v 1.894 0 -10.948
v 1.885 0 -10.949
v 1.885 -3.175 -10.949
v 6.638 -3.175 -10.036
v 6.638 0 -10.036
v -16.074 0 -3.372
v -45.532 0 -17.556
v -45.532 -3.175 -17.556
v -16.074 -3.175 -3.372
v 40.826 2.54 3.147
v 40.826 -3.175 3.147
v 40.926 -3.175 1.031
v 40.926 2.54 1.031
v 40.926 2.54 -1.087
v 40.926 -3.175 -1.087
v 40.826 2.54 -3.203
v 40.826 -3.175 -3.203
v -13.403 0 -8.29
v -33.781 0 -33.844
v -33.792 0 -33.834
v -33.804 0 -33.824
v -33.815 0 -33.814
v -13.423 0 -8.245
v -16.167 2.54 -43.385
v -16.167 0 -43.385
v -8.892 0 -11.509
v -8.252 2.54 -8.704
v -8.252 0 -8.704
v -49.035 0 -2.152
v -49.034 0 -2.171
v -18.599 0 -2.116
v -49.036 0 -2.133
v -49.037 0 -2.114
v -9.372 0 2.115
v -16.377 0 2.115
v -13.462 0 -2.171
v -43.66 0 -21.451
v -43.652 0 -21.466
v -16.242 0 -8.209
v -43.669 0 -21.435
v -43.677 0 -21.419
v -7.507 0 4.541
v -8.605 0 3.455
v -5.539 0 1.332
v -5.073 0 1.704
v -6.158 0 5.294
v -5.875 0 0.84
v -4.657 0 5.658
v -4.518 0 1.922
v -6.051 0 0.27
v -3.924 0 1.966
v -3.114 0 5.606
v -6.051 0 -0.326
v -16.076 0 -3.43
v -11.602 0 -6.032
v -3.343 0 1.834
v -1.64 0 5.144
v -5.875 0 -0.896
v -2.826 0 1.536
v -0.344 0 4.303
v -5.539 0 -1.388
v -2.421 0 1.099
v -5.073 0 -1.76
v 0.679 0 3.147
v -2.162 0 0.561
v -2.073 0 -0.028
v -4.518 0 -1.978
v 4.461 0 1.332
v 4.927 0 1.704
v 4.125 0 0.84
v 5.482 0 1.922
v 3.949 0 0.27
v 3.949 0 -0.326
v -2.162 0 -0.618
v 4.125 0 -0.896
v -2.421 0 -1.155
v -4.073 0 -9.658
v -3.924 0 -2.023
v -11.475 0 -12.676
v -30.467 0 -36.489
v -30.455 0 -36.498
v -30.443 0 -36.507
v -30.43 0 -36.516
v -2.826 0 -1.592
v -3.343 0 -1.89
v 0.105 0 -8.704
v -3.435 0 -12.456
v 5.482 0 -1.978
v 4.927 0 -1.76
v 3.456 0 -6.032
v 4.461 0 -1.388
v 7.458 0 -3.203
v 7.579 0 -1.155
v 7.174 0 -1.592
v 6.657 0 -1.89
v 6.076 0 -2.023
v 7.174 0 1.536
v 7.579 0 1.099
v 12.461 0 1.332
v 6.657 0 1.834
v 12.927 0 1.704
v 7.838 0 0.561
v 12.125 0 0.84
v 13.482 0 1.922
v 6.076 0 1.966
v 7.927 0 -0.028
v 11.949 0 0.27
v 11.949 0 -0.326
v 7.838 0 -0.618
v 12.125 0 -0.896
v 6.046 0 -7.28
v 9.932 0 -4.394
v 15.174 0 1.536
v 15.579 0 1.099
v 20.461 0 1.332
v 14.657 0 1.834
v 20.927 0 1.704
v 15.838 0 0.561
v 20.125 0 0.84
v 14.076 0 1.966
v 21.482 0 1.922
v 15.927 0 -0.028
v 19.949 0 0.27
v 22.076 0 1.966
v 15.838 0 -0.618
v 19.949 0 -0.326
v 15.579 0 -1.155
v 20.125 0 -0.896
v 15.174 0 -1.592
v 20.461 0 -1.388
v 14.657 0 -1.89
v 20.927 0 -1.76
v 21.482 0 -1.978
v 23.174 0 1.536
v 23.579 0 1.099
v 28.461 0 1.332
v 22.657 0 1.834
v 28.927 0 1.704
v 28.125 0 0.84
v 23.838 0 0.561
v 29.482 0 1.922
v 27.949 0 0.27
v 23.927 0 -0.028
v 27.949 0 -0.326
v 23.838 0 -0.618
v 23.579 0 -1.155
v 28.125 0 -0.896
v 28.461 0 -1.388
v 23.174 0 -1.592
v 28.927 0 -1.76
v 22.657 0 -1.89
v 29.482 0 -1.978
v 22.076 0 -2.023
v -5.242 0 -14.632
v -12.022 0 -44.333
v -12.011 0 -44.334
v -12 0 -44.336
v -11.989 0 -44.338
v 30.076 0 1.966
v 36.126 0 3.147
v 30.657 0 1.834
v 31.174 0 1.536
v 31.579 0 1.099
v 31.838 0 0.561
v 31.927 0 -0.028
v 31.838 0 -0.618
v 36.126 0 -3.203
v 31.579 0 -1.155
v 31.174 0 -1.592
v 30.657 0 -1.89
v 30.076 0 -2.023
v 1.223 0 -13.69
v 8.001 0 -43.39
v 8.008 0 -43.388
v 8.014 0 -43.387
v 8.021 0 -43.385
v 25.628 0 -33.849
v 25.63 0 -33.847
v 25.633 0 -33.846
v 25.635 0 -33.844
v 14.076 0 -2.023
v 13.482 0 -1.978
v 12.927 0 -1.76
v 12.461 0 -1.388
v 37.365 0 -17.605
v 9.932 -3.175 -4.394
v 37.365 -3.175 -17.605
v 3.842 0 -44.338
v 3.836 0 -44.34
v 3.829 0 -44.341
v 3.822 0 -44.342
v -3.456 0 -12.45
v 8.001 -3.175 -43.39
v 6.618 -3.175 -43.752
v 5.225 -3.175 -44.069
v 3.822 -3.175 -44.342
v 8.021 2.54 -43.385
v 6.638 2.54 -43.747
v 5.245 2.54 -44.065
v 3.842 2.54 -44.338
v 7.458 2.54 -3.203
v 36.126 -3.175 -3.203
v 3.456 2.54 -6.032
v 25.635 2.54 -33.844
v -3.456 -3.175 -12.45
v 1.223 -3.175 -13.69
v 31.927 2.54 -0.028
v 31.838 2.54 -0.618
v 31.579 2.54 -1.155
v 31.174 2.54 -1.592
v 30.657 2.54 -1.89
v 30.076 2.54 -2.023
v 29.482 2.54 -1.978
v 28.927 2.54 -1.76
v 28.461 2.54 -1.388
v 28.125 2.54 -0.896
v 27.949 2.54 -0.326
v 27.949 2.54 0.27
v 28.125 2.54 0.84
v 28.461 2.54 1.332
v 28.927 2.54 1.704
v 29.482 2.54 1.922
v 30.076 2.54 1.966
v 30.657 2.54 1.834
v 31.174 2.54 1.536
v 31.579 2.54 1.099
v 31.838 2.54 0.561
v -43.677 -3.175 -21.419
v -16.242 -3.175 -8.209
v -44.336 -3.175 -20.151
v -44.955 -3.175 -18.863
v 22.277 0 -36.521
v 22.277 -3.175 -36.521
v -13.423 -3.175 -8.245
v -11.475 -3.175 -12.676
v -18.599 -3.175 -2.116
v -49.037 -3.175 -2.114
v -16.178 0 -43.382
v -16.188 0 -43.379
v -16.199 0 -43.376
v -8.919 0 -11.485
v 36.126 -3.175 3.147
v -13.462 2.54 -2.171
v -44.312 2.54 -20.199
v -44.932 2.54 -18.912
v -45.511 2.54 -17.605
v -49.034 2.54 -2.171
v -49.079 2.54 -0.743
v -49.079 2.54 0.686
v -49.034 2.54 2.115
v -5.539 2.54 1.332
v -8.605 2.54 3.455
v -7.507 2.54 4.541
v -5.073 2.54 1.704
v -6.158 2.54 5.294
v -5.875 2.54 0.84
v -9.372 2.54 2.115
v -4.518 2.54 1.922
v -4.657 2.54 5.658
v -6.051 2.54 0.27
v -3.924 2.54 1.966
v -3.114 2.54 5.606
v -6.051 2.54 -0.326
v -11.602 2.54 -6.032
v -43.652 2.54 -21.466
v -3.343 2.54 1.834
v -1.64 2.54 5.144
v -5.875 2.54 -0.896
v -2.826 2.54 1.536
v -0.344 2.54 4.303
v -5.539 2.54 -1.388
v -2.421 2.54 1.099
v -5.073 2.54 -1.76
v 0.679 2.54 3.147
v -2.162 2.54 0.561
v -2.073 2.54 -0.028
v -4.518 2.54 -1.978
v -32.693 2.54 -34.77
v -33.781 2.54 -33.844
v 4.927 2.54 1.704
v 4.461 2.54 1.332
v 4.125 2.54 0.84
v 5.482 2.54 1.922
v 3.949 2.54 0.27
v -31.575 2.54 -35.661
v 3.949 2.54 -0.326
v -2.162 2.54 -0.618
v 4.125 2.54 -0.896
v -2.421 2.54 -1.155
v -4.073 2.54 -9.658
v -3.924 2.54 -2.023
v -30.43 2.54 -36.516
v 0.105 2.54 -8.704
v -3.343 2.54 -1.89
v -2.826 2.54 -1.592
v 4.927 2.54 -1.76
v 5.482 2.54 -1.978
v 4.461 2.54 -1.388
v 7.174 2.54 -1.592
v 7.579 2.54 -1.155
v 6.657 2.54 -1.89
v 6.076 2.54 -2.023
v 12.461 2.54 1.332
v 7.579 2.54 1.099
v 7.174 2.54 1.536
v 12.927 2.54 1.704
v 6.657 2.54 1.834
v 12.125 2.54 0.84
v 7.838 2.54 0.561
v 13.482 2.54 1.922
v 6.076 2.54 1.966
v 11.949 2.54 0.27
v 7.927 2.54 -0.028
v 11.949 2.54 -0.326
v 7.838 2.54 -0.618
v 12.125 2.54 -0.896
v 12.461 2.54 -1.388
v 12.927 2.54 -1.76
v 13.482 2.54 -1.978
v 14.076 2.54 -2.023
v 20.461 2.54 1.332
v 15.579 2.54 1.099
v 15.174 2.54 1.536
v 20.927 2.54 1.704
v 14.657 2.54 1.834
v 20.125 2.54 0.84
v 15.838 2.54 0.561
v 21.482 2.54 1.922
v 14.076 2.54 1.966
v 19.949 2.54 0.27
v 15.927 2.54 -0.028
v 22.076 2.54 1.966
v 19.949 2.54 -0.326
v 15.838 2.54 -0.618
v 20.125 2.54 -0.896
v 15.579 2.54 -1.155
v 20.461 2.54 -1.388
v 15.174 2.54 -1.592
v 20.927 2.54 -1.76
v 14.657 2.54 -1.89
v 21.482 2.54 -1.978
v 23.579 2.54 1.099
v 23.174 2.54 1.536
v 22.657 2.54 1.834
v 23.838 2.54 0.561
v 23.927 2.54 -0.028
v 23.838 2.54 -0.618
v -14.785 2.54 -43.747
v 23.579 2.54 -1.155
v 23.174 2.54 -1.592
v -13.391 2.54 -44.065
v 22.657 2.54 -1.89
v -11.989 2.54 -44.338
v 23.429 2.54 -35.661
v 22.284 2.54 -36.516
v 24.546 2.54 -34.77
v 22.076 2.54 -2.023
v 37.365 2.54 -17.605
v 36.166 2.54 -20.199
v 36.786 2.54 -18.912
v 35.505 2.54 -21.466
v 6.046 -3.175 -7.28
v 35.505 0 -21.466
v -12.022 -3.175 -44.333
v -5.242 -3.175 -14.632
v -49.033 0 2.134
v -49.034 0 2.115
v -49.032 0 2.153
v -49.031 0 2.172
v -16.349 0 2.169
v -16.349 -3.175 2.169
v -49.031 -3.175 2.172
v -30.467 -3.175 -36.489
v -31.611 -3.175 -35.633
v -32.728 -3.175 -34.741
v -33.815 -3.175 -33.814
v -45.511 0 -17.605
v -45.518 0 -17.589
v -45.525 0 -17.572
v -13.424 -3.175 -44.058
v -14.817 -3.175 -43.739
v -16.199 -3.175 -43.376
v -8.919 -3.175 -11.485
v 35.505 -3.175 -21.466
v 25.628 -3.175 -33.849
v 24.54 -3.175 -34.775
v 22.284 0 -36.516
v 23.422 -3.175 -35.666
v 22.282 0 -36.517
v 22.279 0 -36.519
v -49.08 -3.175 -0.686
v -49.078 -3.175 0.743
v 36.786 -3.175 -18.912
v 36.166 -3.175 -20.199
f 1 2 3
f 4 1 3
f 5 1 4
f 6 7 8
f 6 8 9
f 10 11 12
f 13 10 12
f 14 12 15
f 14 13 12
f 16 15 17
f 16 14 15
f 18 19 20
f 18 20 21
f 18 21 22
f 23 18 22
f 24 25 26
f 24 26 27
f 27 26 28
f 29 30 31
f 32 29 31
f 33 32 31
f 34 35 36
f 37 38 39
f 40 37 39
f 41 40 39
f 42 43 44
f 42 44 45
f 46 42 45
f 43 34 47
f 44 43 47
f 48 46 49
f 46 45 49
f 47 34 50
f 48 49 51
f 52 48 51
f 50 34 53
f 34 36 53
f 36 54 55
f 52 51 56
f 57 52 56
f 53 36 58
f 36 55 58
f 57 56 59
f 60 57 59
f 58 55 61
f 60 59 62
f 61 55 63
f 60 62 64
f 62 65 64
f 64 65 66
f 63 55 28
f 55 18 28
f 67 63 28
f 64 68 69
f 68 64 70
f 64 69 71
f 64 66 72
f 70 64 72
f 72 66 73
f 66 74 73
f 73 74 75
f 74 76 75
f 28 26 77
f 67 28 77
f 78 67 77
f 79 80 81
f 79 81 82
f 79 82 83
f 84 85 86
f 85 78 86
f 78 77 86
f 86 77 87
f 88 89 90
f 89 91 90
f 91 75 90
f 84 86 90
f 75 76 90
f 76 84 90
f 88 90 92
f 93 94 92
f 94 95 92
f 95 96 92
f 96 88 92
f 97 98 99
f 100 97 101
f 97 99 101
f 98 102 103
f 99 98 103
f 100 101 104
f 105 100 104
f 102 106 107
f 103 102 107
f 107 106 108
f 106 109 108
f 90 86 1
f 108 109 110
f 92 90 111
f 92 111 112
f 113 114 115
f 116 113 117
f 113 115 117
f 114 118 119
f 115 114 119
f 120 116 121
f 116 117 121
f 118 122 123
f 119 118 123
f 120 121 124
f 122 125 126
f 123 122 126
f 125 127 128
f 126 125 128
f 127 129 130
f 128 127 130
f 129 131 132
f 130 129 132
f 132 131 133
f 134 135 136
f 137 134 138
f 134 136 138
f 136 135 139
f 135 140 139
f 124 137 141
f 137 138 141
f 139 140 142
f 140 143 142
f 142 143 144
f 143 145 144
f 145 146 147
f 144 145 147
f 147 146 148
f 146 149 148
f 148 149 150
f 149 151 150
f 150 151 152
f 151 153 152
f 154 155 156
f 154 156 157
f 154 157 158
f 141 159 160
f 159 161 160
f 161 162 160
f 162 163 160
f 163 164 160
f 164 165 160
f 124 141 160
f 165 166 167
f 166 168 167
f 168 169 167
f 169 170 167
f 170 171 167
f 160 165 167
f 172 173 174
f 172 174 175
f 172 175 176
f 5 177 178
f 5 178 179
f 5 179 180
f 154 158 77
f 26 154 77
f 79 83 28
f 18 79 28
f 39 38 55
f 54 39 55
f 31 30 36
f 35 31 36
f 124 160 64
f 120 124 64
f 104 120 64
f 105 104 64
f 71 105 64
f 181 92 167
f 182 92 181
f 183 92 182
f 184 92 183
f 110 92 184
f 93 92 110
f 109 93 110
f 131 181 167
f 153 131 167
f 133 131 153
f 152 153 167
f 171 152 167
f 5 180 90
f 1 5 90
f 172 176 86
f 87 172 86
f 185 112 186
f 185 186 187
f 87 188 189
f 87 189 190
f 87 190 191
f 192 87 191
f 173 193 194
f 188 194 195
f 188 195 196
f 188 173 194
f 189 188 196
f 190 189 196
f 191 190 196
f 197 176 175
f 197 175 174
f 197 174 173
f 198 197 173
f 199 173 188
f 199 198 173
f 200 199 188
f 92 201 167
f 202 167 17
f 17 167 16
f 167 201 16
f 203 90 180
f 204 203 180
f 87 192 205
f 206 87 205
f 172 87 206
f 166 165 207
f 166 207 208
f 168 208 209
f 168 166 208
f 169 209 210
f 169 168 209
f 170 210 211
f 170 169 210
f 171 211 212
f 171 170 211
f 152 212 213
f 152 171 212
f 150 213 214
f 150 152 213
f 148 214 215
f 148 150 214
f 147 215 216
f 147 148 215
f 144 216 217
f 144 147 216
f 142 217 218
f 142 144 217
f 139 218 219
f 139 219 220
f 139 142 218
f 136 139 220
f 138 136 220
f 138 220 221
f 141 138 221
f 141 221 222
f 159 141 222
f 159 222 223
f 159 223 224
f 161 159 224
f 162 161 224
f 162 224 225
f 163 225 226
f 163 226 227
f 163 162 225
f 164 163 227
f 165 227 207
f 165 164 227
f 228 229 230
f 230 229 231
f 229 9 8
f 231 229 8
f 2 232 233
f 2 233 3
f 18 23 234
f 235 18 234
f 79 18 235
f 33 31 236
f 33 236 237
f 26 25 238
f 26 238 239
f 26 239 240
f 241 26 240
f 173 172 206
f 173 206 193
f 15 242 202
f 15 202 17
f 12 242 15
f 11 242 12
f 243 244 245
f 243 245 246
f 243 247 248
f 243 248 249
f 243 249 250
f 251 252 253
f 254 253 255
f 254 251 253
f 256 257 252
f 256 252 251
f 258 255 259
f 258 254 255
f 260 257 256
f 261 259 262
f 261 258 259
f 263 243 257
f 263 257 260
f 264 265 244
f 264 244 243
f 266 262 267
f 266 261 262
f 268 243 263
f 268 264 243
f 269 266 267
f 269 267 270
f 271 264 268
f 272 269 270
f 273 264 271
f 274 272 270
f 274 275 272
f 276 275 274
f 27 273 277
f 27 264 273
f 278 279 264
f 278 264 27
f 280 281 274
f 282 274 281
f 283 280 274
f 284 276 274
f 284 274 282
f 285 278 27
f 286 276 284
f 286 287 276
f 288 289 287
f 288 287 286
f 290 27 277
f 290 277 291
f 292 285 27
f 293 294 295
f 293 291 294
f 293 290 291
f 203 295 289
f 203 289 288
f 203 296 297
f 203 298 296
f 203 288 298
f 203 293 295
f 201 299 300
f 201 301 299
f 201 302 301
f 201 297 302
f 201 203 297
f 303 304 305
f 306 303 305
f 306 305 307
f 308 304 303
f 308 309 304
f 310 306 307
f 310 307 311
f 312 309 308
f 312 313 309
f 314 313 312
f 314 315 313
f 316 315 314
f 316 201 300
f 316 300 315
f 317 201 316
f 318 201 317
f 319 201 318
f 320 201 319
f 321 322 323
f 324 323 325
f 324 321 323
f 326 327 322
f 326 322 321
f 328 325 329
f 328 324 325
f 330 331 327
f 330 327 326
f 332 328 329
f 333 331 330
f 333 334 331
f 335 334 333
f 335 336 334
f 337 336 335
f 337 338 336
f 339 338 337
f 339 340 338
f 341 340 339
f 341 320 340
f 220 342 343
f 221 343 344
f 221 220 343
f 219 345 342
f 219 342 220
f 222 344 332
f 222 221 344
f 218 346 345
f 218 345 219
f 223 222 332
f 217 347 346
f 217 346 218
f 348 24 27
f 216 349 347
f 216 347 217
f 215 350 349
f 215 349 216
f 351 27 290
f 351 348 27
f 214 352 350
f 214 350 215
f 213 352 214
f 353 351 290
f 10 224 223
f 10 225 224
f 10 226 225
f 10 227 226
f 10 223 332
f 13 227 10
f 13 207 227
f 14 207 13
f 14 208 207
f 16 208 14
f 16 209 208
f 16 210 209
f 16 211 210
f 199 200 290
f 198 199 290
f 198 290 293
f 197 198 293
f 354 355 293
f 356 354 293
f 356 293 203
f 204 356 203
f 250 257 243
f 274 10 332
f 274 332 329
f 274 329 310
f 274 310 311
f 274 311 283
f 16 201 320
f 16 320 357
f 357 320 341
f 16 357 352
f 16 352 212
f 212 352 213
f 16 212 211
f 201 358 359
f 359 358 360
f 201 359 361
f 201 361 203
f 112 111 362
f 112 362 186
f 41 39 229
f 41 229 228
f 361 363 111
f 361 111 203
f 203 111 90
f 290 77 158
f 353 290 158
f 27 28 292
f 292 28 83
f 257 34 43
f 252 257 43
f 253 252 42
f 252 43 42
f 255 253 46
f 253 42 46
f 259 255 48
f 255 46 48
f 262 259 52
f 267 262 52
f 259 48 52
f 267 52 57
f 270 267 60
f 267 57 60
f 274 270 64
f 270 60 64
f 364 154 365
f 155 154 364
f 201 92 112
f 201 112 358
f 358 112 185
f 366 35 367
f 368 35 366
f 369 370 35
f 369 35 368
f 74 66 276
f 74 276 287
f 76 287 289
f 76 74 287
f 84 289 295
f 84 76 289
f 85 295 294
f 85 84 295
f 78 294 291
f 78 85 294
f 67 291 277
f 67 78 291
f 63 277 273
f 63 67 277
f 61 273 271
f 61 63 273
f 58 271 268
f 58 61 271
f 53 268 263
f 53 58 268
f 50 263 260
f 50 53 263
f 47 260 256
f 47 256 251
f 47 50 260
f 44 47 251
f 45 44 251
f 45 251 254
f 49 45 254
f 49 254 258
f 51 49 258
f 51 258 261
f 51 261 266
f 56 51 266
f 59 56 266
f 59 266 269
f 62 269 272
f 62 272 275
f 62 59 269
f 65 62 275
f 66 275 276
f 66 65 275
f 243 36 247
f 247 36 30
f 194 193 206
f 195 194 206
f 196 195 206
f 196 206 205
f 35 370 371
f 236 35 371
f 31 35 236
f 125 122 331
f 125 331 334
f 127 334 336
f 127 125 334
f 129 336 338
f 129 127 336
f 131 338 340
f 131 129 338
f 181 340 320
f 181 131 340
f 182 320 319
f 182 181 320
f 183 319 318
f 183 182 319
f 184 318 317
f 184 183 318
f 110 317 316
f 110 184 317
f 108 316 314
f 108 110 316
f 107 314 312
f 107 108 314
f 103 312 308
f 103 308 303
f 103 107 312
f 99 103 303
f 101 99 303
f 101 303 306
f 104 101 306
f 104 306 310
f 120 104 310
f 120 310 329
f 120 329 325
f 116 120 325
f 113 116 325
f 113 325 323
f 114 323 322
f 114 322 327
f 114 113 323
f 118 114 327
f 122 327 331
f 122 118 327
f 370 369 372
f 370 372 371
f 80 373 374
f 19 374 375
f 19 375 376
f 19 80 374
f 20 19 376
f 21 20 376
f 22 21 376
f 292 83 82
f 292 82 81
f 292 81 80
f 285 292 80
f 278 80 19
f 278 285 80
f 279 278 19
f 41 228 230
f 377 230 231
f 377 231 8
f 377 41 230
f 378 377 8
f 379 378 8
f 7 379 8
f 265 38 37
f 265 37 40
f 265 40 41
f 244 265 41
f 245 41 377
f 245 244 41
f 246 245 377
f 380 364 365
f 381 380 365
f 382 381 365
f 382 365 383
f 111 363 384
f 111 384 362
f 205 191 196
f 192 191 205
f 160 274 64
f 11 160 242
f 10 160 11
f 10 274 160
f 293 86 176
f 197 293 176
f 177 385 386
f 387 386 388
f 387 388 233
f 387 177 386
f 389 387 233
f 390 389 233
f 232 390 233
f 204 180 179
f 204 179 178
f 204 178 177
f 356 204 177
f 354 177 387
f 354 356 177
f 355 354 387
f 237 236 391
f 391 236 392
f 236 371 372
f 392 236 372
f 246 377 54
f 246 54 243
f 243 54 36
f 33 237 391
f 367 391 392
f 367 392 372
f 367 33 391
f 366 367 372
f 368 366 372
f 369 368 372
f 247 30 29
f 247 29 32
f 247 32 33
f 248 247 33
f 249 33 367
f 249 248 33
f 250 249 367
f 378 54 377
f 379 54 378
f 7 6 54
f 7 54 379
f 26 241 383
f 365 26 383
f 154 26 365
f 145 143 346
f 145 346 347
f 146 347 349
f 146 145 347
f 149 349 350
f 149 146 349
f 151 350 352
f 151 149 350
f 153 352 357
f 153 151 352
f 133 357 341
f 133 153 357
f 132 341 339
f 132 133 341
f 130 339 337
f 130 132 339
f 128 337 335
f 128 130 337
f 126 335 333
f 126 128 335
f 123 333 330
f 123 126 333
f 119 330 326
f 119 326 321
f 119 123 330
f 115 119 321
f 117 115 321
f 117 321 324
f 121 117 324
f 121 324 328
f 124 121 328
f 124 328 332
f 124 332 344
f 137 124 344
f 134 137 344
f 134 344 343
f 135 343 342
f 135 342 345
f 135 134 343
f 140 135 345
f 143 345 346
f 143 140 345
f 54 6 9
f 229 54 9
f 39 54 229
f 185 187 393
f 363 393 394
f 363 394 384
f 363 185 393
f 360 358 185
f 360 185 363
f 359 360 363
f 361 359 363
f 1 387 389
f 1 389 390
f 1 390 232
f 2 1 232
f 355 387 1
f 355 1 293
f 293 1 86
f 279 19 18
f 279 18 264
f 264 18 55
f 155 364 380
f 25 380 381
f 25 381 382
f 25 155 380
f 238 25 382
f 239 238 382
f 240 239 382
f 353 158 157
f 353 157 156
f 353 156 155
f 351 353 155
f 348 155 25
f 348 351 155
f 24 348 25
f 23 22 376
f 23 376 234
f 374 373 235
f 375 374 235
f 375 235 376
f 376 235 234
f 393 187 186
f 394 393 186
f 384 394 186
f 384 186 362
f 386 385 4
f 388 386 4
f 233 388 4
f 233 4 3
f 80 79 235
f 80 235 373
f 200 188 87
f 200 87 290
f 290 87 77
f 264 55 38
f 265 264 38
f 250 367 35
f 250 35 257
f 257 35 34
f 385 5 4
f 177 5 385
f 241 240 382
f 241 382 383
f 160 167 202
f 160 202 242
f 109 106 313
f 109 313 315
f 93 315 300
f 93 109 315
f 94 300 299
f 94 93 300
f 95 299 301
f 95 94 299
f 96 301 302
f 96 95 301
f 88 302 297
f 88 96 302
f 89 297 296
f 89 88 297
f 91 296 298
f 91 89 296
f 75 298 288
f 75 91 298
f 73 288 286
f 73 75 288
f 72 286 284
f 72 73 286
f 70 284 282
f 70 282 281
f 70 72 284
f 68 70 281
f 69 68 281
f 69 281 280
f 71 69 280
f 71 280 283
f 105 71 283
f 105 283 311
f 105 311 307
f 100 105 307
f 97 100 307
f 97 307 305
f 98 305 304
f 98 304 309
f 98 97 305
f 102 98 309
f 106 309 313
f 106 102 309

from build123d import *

# Parameters (mm, degrees)
SKETCH1_R           = 2
BOSS_EXTRUDE1_DEPTH = 2.54
BOSS_EXTRUDE2_DEPTH = 3.175
SKETCH4_W           = 8.755126744
SKETCH4_H           = 6.35
BOSS_EXTRUDE3_DEPTH = 3.175
SKETCH5_R           = 56.952437084
SKETCH5_R_2         = 45.011733307
CUT_EXTRUDE1_DEPTH  = 15.24


with BuildPart() as part:
    # Sketch1 → Boss-Extrude1 (new body)
    with BuildSketch(Plane(origin=(0, 0, 0), x_dir=(1, 0, 0), z_dir=(0, 1, 0))):
        with BuildLine():
            Line((-12.877451354, 48.231560826), (-17.055698858, 47.277903099))
            Line((-17.055698858, 47.277903099), (-8.251532809, 8.704331291))
            Line((-8.251532809, 8.704331291), (-32.920257894, 39.637934129))
            Line((-32.920257894, 39.637934129), (-36.270952237, 36.965844556))
            Line((-36.270952237, 36.965844556), (-11.602227151, 6.032241718))
            Line((-11.602227151, 6.032241718), (-47.249567728, 23.199096168))
            Line((-47.249567728, 23.199096168), (-49.109062801, 19.337814861))
            Line((-49.109062801, 19.337814861), (-13.461722225, 2.170960411))
            Line((-13.461722225, 2.170960411), (-53.027285305, 2.170960411))
            Line((-53.027285305, 2.170960411), (-53.027285305, -2.114738512))
            Line((-53.027285305, -2.114738512), (-9.372018351, -2.114738512))
            ThreePointArc((-9.372018351, -2.114738512), (-4.657137499, -5.657616121), (0.679371921, -3.14688905))
            Line((0.679371921, -3.14688905), (44.880714695, -3.14688905))
            Line((44.880714695, -3.14688905), (44.880714695, 0.02811095))
            Line((44.880714695, 0.02811095), (44.880714695, 3.20311095))
            Line((44.880714695, 3.20311095), (7.458434292, 3.20311095))
            Line((7.458434292, 3.20311095), (40.962492191, 19.337814861))
            Line((40.962492191, 19.337814861), (39.102997117, 23.199096168))
            Line((39.102997117, 23.199096168), (3.455656541, 6.032241718))
            Line((3.455656541, 6.032241718), (28.124381626, 36.965844556))
            Line((28.124381626, 36.965844556), (24.773687284, 39.637934129))
            Line((24.773687284, 39.637934129), (0.104962198, 8.704331291))
            Line((0.104962198, 8.704331291), (8.909128247, 47.277903099))
            Line((8.909128247, 47.277903099), (4.730880744, 48.231560826))
            Line((4.730880744, 48.231560826), (-4.073285305, 9.657989018))
            Line((-4.073285305, 9.657989018), (-12.877451354, 48.231560826))
        make_face()
        with Locations((-4.073285305, 0.02811095)):
            Circle(SKETCH1_R, mode=Mode.SUBTRACT)
        with Locations((5.926714695, 0.02811095)):
            Circle(SKETCH1_R, mode=Mode.SUBTRACT)
        with Locations((13.926714695, 0.02811095)):
            Circle(SKETCH1_R, mode=Mode.SUBTRACT)
        with Locations((21.926714695, 0.02811095)):
            Circle(SKETCH1_R, mode=Mode.SUBTRACT)
        with Locations((29.926714695, 0.02811095)):
            Circle(SKETCH1_R, mode=Mode.SUBTRACT)
    extrude(amount=BOSS_EXTRUDE1_DEPTH)

    # Sketch3 → Boss-Extrude2 (add)
    with BuildSketch(Plane.XZ):
        Polygon((40.962492191, -19.337814861), (39.102997117, -23.199096168), (6.04600763, -7.279689057), (9.932157206, -4.394393119), align=None)
        Polygon((6.638401546, -10.036078698), (28.111723935, -36.963461939), (24.76099628, -39.635509739), (1.885207385, -10.949444147), align=None)
        Polygon((1.222949052, -13.689887234), (8.885971689, -47.267642171), (4.707700409, -48.221195721), (-3.455809874, -12.450409084), align=None)
        Polygon((-5.241544906, -14.632097606), (-12.906660536, -48.209374817), (-17.08487237, -47.255560825), (-8.919132396, -11.485283116), align=None)
        Polygon((-11.474638084, -12.676083302), (-32.949638901, -39.602127989), (-36.300199991, -36.929871333), (-13.422623046, -8.245231717), align=None)
        Polygon((-16.241722503, -8.209278105), (-47.272988898, -23.150765598), (-49.132243282, -19.28936839), (-16.074261552, -3.372021857), align=None)
        Polygon((-18.598567057, -2.116435888), (-53.039640443, -2.113859702), (-53.039319873, 2.171839209), (-16.348829699, 2.169094767), align=None)
    extrude(amount=BOSS_EXTRUDE2_DEPTH)

    # Sketch4 → Boss-Extrude3 (add)
    with BuildSketch(Plane.XZ):
        with Locations((40.503151323, -0.02811095)):
            Rectangle(SKETCH4_W, SKETCH4_H)
    extrude(amount=BOSS_EXTRUDE3_DEPTH)

    # Sketch5 → Cut-Extrude1 (cut)
    with BuildSketch(Plane(origin=(0, 2.54, 0), x_dir=(1, 0, 0), z_dir=(0, 1, 0))):
        with Locations((-4.073285305, 0.02811095)):
            Circle(SKETCH5_R)
        with Locations((-4.073285305, 0.02811095)):
            Circle(SKETCH5_R_2, mode=Mode.SUBTRACT)
    extrude(amount=-CUT_EXTRUDE1_DEPTH, mode=Mode.SUBTRACT)


solid = part.part
